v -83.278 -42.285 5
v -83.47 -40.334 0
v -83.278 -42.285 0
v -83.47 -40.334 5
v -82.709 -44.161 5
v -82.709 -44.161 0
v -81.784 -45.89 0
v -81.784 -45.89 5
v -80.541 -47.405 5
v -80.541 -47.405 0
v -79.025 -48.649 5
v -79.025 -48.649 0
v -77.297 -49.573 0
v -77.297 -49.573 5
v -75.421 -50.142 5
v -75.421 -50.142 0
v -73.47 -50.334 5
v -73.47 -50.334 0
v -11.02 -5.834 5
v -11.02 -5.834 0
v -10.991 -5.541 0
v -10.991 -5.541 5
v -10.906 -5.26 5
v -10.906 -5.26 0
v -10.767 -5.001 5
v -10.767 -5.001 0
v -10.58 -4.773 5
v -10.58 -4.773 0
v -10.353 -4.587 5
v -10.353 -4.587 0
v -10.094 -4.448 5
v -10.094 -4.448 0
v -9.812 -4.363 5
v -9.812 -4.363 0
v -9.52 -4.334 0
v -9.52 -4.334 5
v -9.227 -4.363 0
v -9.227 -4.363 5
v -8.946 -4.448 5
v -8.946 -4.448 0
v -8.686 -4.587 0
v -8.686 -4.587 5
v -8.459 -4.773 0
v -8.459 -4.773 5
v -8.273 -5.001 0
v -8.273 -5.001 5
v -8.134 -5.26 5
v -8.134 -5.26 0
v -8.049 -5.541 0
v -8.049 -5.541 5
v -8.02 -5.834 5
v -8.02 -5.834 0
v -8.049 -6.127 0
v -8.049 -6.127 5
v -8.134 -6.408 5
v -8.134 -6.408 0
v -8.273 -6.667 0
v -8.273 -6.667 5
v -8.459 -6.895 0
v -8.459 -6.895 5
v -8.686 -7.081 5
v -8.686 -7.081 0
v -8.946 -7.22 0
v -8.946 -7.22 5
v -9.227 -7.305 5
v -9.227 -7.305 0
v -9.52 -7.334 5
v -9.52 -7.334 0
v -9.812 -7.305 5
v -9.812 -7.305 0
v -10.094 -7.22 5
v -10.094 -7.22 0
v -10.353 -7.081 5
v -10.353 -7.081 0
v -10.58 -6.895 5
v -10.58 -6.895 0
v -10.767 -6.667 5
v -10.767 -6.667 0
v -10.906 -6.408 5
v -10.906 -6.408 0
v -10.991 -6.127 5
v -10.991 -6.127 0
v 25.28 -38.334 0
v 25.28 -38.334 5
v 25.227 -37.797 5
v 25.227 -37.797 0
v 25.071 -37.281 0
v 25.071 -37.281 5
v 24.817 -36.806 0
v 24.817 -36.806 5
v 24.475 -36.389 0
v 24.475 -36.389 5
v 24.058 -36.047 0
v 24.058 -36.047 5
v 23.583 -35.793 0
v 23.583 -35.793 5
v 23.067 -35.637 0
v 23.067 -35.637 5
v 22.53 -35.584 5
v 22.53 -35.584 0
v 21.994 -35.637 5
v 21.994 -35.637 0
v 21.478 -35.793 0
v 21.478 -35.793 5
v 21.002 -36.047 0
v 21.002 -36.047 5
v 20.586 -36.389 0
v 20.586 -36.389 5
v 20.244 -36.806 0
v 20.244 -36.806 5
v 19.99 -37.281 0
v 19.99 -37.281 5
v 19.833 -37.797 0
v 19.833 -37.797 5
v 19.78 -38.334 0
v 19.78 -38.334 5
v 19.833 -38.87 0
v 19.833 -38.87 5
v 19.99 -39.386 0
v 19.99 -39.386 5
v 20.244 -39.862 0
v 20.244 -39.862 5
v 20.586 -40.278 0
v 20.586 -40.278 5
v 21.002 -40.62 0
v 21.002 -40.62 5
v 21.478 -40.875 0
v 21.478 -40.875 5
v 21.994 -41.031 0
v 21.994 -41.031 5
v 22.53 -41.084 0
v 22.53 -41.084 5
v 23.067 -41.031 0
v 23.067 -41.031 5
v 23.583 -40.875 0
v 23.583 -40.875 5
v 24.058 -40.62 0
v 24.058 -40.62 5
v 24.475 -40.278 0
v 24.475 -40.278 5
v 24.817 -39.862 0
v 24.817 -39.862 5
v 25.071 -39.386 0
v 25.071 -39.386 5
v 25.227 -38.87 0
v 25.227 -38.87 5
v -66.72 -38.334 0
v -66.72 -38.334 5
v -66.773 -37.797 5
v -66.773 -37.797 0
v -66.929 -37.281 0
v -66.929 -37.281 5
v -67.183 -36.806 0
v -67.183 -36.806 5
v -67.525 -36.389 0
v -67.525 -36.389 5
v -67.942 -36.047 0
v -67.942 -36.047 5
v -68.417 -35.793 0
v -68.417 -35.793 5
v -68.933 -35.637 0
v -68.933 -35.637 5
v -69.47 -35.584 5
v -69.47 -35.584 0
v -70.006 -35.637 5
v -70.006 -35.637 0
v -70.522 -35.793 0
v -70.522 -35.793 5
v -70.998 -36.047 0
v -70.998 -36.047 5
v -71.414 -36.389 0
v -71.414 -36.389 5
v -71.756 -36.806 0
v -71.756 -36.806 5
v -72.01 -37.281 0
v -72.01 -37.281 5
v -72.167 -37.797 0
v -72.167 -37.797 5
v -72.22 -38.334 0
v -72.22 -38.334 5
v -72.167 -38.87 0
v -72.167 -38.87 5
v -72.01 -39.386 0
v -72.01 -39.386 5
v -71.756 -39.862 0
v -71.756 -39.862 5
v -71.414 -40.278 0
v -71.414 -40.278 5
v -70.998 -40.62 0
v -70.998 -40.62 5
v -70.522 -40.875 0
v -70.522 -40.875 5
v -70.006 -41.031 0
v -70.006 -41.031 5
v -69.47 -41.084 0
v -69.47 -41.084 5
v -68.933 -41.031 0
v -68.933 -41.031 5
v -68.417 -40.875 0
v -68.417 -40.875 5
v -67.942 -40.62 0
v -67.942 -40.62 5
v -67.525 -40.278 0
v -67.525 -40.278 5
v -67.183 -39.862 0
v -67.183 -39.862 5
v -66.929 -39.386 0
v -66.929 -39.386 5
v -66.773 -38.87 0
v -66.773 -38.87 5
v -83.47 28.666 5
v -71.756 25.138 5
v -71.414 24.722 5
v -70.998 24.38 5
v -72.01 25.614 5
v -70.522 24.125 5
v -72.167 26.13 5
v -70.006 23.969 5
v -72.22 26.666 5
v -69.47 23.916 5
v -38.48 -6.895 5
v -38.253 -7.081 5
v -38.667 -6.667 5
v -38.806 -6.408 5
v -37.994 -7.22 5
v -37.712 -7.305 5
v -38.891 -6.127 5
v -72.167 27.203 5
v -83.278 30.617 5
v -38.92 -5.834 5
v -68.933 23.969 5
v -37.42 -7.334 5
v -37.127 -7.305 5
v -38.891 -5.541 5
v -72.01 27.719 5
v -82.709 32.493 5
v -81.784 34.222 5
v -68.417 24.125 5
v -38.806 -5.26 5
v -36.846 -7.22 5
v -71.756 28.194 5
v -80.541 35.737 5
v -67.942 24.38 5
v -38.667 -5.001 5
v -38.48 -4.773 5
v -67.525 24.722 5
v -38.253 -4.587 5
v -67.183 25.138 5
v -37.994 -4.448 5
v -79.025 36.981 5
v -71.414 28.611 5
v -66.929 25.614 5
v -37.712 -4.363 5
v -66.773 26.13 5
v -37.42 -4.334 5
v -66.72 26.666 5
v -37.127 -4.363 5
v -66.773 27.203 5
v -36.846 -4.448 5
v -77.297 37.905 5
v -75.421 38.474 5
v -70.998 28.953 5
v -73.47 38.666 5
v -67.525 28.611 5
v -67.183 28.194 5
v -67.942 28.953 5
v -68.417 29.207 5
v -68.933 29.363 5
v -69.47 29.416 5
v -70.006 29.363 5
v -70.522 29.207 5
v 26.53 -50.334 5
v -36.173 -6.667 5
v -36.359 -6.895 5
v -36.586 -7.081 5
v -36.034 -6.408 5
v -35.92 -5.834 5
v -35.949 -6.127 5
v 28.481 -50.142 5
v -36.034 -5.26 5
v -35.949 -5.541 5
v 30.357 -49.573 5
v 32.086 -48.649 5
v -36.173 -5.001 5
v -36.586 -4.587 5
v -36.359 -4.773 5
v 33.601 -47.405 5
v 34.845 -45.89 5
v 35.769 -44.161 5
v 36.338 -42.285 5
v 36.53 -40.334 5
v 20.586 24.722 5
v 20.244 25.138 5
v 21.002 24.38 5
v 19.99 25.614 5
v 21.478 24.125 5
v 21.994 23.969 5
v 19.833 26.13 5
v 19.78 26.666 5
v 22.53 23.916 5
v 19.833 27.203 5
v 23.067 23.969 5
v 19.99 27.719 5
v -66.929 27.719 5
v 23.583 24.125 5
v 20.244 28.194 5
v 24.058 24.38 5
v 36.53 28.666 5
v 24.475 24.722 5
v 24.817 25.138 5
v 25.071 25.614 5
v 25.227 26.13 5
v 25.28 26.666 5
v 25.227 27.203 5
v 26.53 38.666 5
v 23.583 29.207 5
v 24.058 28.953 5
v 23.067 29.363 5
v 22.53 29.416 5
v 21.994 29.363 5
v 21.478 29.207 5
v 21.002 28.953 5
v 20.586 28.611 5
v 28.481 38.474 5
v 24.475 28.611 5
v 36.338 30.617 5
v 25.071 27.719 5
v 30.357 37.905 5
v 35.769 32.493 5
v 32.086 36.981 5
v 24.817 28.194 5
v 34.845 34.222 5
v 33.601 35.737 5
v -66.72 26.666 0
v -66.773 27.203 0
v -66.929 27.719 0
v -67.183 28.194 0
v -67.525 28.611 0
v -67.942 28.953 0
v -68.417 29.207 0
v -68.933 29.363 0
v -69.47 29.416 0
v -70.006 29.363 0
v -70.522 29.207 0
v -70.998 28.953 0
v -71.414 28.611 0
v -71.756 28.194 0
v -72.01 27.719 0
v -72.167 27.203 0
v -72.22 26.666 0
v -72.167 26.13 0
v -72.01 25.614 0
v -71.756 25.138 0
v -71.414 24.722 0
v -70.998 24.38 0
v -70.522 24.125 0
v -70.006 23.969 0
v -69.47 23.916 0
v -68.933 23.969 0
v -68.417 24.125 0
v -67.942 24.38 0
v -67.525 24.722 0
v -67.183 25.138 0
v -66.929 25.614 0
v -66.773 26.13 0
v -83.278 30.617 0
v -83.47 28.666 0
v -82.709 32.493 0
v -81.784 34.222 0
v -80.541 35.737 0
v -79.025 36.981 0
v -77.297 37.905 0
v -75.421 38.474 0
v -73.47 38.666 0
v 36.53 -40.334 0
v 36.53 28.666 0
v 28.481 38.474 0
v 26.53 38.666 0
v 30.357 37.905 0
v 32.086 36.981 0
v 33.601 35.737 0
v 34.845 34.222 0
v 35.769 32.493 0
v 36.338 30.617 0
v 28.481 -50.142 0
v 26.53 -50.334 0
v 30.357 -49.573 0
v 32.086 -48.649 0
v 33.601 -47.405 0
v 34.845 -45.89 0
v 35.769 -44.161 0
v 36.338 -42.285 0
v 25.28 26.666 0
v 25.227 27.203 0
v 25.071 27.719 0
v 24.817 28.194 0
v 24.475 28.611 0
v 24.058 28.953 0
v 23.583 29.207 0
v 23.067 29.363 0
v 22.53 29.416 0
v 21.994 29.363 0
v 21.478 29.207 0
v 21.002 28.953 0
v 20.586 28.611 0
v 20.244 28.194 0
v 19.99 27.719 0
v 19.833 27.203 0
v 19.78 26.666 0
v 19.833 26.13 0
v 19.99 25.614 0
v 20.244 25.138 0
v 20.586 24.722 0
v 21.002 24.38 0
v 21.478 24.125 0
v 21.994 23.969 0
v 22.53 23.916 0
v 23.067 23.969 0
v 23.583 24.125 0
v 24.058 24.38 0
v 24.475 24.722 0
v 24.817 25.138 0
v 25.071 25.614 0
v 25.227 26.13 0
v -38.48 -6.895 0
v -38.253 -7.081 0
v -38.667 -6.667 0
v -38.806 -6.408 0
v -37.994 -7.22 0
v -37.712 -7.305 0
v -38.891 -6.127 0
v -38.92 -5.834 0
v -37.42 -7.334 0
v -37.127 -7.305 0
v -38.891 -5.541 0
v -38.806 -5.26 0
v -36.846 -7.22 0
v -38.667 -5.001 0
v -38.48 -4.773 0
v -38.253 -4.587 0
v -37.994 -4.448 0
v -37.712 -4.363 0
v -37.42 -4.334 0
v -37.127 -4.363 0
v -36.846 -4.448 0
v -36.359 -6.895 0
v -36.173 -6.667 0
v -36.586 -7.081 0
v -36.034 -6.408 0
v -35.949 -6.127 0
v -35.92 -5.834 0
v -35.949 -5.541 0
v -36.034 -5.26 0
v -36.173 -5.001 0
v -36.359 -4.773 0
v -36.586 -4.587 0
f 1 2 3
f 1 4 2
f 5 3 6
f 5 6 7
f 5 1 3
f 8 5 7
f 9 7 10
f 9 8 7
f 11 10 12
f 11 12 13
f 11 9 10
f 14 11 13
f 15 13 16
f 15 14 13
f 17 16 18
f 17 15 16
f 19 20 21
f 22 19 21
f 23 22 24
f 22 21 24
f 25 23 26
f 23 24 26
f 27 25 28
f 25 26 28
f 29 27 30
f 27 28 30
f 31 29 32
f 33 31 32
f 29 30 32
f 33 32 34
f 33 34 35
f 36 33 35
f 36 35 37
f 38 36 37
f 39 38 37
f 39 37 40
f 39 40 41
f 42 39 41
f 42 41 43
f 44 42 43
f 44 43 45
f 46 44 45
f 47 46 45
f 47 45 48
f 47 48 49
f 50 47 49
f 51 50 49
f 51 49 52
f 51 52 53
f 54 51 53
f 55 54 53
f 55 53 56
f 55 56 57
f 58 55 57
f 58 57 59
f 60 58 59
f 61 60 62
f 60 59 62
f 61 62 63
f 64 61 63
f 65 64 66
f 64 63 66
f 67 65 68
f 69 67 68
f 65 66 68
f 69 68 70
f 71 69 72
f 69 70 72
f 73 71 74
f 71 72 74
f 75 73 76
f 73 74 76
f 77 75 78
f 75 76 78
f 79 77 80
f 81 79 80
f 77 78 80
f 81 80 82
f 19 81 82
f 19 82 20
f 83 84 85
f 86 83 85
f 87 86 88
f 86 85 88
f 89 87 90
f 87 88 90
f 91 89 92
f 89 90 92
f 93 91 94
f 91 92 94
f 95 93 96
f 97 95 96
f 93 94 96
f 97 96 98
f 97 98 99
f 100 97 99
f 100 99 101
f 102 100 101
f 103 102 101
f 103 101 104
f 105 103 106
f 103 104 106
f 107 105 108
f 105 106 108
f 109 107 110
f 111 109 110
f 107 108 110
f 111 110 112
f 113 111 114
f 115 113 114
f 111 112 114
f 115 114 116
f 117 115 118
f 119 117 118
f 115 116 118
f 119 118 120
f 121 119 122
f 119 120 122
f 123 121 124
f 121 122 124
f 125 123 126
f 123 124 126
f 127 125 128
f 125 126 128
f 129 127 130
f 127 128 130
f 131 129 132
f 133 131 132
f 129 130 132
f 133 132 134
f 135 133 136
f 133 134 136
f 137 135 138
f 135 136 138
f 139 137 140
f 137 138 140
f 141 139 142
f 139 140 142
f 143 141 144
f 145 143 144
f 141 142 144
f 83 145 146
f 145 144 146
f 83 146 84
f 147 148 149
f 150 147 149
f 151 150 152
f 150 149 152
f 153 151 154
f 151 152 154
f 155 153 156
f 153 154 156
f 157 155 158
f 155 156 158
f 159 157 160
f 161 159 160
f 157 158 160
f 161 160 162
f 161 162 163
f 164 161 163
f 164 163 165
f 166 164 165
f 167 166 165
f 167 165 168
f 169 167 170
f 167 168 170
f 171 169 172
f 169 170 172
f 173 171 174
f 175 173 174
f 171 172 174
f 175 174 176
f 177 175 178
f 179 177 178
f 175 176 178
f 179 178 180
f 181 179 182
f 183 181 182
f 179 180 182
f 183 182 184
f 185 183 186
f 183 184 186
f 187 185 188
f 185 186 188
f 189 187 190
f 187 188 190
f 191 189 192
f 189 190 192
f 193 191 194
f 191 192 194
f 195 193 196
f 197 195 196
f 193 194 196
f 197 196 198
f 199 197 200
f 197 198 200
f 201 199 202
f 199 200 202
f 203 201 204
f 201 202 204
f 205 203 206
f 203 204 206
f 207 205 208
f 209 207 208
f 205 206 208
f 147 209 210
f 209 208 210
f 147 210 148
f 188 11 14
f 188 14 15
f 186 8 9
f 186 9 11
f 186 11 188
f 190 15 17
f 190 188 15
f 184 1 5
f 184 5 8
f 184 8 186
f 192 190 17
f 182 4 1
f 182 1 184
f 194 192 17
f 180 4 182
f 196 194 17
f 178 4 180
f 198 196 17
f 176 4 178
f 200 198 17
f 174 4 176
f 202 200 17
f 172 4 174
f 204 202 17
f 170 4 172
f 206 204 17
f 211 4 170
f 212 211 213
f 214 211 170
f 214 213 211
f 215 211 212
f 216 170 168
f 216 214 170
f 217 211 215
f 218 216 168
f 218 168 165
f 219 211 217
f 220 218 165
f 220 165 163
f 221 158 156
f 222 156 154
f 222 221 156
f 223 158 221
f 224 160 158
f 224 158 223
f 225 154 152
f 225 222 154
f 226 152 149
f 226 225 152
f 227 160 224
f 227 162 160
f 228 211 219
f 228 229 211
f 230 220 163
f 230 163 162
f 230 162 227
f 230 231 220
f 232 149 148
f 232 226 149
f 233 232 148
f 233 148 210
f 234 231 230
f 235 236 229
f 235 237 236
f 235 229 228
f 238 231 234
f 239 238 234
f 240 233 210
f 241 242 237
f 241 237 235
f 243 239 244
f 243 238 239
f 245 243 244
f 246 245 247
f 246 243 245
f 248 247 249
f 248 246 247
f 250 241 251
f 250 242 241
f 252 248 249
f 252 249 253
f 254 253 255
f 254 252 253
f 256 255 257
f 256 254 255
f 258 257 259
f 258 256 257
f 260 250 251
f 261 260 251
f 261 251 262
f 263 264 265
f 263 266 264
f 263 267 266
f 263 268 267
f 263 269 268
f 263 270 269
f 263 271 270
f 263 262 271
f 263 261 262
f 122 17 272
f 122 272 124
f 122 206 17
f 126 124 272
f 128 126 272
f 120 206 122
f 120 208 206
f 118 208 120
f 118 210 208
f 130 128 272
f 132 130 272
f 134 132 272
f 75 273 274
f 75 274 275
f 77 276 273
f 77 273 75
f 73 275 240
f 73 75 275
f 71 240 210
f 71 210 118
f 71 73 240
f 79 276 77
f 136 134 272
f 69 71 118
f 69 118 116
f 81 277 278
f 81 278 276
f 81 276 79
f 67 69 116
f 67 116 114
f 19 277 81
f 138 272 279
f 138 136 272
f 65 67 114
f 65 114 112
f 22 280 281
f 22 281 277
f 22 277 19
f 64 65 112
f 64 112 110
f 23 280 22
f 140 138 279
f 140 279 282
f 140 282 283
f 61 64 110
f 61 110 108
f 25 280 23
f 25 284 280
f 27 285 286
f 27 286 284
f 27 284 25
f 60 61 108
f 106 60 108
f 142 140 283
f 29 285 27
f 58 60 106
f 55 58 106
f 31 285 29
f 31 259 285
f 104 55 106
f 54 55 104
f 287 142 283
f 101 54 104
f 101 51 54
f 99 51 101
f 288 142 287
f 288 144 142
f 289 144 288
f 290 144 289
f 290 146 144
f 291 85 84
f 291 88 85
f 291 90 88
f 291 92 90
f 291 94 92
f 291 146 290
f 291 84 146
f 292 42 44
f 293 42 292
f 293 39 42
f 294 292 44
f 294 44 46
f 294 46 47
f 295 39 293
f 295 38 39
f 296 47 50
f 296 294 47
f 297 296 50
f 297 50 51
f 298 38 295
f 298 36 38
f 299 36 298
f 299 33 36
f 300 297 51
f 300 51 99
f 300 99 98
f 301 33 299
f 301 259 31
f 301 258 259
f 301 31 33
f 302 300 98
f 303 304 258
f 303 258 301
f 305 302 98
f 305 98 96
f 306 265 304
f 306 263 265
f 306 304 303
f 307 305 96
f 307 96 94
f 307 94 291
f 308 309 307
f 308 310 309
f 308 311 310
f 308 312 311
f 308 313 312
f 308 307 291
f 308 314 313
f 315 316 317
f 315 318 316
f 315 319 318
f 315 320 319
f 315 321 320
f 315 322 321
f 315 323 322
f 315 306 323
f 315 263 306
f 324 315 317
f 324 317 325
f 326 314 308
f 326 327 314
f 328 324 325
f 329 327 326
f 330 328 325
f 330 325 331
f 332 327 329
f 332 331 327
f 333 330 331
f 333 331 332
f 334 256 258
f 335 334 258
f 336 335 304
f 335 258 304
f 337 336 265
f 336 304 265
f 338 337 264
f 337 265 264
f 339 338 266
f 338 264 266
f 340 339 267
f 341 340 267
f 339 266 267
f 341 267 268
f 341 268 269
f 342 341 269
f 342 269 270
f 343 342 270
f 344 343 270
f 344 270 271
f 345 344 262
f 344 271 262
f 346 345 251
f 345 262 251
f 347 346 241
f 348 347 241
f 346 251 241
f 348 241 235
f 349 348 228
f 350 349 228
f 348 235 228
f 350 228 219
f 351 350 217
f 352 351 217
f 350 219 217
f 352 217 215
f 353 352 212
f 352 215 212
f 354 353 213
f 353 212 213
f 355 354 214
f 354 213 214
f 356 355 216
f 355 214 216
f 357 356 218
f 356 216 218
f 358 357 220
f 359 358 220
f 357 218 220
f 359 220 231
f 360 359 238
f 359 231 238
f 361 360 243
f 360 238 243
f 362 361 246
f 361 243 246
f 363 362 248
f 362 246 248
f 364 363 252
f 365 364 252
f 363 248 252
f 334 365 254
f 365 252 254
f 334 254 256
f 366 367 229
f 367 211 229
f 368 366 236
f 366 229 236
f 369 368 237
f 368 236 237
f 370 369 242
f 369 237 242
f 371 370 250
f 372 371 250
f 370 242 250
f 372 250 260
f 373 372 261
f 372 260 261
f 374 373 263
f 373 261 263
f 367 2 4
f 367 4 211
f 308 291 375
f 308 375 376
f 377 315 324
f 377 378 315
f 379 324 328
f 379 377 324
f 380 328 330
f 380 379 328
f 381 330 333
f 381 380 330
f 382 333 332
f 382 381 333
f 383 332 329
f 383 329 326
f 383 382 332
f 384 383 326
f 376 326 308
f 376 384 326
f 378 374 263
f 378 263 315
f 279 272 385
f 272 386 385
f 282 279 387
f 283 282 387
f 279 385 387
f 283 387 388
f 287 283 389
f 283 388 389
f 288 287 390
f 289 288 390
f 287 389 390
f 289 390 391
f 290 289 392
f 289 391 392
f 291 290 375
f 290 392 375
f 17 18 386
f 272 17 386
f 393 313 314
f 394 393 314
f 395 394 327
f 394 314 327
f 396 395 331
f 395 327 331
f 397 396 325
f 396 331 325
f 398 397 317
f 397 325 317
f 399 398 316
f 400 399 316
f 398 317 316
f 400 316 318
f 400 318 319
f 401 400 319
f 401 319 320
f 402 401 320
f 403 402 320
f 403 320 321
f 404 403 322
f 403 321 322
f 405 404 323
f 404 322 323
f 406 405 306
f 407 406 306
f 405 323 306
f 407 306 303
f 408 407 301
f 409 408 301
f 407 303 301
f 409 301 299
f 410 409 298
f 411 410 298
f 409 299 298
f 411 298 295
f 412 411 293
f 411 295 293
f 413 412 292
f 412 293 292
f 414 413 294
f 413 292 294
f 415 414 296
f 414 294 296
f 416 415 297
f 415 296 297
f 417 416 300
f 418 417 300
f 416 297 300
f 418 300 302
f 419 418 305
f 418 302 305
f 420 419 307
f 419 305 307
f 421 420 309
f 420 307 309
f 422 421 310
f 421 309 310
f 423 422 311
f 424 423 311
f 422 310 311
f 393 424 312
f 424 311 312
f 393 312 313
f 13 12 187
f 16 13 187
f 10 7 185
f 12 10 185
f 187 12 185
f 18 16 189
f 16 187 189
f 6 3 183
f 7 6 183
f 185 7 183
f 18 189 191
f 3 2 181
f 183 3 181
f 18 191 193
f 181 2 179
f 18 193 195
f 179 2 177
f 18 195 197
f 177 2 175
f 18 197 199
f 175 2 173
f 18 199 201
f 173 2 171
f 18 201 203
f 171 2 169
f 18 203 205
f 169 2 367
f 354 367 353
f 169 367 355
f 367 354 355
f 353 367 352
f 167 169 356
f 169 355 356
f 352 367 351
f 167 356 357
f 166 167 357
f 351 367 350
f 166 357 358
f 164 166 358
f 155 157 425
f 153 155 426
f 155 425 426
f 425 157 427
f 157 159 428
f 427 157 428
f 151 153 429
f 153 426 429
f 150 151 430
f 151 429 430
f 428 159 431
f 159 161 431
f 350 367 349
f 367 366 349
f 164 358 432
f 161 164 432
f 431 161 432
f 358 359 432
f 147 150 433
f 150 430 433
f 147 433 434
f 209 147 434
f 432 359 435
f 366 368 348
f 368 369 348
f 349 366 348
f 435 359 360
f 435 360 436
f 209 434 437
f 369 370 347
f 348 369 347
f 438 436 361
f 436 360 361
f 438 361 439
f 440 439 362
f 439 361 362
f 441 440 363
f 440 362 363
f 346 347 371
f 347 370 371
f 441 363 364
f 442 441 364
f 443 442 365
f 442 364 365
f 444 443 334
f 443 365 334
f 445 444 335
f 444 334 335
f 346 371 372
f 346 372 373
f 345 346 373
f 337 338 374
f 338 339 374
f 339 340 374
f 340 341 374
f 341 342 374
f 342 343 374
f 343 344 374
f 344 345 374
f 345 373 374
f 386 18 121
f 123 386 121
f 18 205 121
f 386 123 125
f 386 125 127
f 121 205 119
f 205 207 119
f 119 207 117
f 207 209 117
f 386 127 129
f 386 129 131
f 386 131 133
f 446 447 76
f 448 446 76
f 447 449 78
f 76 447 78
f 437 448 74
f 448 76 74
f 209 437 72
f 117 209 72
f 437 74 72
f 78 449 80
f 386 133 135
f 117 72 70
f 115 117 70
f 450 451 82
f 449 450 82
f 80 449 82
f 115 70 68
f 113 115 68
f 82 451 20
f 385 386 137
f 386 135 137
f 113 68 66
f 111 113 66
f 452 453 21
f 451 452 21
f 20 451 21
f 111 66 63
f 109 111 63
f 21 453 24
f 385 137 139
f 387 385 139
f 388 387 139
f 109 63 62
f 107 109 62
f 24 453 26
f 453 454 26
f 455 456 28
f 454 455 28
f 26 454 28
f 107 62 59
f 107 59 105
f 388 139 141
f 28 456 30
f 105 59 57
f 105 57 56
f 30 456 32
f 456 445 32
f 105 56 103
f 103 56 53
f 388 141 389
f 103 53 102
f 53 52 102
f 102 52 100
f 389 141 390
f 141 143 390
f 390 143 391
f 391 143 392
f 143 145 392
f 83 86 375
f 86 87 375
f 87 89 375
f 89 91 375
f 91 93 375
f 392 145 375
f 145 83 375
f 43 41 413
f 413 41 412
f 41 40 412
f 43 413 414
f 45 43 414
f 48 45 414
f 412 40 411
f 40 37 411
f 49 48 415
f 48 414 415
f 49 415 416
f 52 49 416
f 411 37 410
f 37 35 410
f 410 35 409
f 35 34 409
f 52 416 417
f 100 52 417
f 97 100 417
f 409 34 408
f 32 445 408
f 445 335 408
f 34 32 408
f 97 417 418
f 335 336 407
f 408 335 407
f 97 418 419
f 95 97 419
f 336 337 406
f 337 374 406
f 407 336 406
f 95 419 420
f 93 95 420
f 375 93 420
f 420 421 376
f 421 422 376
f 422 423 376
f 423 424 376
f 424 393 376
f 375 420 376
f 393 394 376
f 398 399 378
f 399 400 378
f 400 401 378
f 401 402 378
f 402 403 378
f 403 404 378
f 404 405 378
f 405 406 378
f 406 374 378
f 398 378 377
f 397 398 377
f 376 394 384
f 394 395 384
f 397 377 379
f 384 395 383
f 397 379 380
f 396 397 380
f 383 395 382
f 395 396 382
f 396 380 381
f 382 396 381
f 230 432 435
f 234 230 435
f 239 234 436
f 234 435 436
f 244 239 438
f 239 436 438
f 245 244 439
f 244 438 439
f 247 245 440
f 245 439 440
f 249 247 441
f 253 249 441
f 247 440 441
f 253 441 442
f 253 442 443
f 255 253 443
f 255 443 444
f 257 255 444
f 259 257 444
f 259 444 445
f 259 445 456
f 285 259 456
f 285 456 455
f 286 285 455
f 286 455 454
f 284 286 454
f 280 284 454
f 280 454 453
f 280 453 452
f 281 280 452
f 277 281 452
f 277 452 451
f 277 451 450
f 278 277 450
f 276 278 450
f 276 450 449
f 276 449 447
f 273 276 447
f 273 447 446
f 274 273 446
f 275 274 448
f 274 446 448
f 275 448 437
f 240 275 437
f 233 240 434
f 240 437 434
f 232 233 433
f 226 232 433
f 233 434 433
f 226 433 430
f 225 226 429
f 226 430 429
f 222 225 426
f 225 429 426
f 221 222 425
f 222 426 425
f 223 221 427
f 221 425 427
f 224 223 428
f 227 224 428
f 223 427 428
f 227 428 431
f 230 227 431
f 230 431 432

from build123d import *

# Parameters (mm, degrees)
SKETCH_1_W          = 150
SKETCH_1_H          = 89
EXTRUDE_1_DEPTH     = 5
SKETCH_3_W          = 30
SKETCH_3_H          = 89
CUT_EXTRUDE_1_DEPTH = 5
SKETCH_4_R          = 2.75
CUT_EXTRUDE_2_DEPTH = 5
FILLET_2_R          = 10
SKETCH_5_R          = 1.5
CUT_EXTRUDE_7_DEPTH = 10


with BuildPart() as part:
    # 草图1 → 凸台-拉伸1 (new body)
    with BuildSketch(Plane.XY):
        with Locations((-8.469721768, -5.833878887)):
            Rectangle(SKETCH_1_W, SKETCH_1_H)
    extrude(amount=EXTRUDE_1_DEPTH)

    # 草图3 → 切除-拉伸1 (cut)
    with BuildSketch(Plane.XY.offset(5)):
        with Locations((51.530278232, -5.833878887)):
            Rectangle(SKETCH_3_W, SKETCH_3_H)
    extrude(amount=-CUT_EXTRUDE_1_DEPTH, mode=Mode.SUBTRACT)

    # 草图4 → 切除-拉伸2 (cut)
    with BuildSketch(Plane.XY.offset(5)):
        with Locations((-69.469721768, 26.666121113)):
            Circle(SKETCH_4_R)
        with Locations((-69.469721768, -38.333878887)):
            Circle(SKETCH_4_R)
        with Locations((22.530278232, 26.666121113)):
            Circle(SKETCH_4_R)
        with Locations((22.530278232, -38.333878887)):
            Circle(SKETCH_4_R)
    extrude(amount=-CUT_EXTRUDE_2_DEPTH, mode=Mode.SUBTRACT)

    # 圆角2
    fillet_2_edges = [part.edges().sort_by_distance(p)[0] for p in [
        (36.530278232, 38.666121113, 2.5),
        (36.530278232, -50.333878887, 2.5),
        (-83.469721768, 38.666121113, 2.5),
        (-83.469721768, -50.333878887, 2.5),
    ]]
    fillet(fillet_2_edges, radius=FILLET_2_R)

    # 草图5 → 切除-拉伸7 (cut)
    with BuildSketch(Plane(origin=(0, 0, 0), x_dir=(-1, 0, 0), z_dir=(0, 0, -1))):
        with Locations((9.519721768, -5.833878887)):
            Circle(SKETCH_5_R)
        with Locations((37.419721768, -5.833878887)):
            Circle(SKETCH_5_R)
    extrude(amount=-CUT_EXTRUDE_7_DEPTH, mode=Mode.SUBTRACT)


solid = part.part
